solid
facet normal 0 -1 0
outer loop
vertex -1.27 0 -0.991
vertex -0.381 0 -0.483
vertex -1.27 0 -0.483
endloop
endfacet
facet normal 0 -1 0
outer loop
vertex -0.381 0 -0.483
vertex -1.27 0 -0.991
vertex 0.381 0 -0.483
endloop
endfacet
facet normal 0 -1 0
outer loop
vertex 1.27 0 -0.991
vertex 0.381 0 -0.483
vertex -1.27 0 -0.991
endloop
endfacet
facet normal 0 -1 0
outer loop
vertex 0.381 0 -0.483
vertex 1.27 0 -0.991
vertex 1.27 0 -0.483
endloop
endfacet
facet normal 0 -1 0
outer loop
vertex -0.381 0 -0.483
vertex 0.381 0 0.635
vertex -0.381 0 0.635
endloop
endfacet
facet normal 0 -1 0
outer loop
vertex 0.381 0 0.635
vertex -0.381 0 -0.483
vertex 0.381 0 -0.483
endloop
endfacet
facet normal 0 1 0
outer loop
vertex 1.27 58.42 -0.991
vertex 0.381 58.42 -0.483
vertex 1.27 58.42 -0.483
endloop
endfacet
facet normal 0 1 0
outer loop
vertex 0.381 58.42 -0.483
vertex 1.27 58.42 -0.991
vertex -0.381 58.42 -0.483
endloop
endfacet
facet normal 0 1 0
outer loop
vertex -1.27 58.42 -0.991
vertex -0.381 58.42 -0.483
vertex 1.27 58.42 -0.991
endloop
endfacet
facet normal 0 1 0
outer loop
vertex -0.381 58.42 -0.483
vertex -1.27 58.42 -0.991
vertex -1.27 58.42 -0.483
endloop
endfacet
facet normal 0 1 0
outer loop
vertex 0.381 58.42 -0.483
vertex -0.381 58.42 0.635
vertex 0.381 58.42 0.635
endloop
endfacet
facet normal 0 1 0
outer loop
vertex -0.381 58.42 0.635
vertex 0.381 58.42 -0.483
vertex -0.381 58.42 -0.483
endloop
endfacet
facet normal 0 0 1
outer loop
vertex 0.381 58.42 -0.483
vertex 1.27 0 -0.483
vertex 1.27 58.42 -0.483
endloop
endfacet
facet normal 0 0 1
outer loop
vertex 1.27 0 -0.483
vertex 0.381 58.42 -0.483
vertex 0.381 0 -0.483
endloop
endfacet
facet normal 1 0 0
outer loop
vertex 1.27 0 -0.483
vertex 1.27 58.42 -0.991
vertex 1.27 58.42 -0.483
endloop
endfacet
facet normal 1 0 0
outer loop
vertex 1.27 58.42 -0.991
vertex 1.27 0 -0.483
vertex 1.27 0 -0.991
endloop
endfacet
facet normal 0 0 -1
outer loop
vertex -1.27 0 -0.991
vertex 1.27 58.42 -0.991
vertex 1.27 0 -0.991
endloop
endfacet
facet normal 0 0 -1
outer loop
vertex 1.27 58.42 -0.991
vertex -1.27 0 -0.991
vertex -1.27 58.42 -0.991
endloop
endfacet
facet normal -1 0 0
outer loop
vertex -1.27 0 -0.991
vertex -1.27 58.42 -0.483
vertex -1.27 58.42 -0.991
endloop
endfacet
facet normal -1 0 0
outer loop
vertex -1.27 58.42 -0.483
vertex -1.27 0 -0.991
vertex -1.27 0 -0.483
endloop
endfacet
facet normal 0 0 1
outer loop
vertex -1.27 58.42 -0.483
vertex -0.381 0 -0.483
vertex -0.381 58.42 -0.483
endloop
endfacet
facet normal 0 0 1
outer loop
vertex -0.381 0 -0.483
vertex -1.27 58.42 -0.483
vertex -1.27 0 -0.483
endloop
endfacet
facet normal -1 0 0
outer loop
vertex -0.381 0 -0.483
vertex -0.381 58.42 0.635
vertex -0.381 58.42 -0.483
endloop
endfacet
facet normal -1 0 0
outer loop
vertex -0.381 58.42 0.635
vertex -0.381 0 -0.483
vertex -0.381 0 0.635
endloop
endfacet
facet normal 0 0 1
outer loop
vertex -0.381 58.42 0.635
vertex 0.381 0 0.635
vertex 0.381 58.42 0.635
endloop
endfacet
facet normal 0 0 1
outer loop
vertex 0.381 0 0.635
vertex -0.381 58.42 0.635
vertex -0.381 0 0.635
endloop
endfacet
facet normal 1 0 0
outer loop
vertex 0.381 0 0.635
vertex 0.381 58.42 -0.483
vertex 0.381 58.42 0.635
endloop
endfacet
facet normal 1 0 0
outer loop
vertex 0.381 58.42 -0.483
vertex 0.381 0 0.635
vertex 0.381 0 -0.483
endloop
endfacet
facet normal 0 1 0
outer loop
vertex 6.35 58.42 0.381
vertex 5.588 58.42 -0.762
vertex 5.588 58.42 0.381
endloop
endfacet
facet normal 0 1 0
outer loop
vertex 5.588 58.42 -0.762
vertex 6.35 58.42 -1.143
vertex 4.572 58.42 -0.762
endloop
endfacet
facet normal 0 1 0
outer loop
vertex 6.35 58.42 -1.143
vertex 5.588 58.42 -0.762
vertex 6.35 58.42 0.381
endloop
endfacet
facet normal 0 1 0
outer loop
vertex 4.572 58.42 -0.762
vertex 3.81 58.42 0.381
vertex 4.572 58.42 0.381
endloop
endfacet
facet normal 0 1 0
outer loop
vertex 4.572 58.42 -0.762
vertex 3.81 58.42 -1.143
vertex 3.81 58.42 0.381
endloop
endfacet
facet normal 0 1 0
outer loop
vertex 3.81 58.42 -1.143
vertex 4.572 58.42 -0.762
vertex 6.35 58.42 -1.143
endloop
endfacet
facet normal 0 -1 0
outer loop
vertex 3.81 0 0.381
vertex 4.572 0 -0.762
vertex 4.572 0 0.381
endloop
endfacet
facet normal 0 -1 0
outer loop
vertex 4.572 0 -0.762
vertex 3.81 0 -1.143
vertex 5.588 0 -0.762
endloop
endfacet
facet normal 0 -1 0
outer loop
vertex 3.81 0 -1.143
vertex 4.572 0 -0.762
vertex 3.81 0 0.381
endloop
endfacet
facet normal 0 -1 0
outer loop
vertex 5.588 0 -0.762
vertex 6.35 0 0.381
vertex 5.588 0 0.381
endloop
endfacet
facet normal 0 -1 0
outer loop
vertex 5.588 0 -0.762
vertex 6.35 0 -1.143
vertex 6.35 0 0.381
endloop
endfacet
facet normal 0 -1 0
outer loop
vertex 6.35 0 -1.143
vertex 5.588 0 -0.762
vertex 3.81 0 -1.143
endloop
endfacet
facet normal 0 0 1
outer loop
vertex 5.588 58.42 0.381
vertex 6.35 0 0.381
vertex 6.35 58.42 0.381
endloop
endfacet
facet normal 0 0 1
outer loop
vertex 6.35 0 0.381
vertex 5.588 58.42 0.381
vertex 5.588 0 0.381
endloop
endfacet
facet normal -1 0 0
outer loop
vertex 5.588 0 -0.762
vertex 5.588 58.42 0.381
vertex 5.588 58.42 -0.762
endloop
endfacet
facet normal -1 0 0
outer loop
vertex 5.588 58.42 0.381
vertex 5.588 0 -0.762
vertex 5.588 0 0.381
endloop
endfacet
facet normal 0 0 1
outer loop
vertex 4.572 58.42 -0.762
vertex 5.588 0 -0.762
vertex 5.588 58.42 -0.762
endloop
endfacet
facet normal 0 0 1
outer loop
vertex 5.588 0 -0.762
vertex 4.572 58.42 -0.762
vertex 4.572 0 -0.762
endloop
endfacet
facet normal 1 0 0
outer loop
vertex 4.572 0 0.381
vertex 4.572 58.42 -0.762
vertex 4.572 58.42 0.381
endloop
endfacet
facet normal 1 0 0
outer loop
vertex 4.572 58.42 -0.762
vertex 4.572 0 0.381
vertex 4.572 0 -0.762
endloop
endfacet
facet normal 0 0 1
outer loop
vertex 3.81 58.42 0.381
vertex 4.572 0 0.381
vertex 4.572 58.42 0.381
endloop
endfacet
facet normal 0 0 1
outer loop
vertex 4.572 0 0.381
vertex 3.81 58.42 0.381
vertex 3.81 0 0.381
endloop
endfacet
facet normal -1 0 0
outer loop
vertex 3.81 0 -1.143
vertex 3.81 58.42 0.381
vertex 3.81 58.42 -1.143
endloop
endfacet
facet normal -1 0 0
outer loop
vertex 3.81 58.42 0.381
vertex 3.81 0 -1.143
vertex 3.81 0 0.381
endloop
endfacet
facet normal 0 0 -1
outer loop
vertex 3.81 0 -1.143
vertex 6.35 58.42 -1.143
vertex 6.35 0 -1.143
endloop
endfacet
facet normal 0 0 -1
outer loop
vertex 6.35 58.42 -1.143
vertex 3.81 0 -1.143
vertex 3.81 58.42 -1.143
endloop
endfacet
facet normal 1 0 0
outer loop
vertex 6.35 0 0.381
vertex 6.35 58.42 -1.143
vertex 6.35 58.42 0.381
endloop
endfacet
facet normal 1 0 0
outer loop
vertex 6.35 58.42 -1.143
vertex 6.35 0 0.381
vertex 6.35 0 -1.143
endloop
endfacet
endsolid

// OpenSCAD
ViewScale = [0.0254, 0.0254, 0.0254];


module part1()
{
    square([30, 50], center=true);
    translate([0, 29, 0])
    square([100, 20], center=true);
}

module part2()
{
    translate([0, -15, 0])
    difference() 
    {
        square([100, 60], center=true);
        translate([0, 10, 0])
        square([40, 50], center=true);
    }
}

module forviewing()
{
	part1();
    part2();
}

module forprinting()
{
    rotate([-90, 0, 0])
    linear_extrude(2300)
	part1();
    translate([200, 2300, 0])
    rotate([90, 0, 0])
    linear_extrude(2300)
    part2();
}

scale(ViewScale)
{
	//forviewing();
	forprinting();
}
